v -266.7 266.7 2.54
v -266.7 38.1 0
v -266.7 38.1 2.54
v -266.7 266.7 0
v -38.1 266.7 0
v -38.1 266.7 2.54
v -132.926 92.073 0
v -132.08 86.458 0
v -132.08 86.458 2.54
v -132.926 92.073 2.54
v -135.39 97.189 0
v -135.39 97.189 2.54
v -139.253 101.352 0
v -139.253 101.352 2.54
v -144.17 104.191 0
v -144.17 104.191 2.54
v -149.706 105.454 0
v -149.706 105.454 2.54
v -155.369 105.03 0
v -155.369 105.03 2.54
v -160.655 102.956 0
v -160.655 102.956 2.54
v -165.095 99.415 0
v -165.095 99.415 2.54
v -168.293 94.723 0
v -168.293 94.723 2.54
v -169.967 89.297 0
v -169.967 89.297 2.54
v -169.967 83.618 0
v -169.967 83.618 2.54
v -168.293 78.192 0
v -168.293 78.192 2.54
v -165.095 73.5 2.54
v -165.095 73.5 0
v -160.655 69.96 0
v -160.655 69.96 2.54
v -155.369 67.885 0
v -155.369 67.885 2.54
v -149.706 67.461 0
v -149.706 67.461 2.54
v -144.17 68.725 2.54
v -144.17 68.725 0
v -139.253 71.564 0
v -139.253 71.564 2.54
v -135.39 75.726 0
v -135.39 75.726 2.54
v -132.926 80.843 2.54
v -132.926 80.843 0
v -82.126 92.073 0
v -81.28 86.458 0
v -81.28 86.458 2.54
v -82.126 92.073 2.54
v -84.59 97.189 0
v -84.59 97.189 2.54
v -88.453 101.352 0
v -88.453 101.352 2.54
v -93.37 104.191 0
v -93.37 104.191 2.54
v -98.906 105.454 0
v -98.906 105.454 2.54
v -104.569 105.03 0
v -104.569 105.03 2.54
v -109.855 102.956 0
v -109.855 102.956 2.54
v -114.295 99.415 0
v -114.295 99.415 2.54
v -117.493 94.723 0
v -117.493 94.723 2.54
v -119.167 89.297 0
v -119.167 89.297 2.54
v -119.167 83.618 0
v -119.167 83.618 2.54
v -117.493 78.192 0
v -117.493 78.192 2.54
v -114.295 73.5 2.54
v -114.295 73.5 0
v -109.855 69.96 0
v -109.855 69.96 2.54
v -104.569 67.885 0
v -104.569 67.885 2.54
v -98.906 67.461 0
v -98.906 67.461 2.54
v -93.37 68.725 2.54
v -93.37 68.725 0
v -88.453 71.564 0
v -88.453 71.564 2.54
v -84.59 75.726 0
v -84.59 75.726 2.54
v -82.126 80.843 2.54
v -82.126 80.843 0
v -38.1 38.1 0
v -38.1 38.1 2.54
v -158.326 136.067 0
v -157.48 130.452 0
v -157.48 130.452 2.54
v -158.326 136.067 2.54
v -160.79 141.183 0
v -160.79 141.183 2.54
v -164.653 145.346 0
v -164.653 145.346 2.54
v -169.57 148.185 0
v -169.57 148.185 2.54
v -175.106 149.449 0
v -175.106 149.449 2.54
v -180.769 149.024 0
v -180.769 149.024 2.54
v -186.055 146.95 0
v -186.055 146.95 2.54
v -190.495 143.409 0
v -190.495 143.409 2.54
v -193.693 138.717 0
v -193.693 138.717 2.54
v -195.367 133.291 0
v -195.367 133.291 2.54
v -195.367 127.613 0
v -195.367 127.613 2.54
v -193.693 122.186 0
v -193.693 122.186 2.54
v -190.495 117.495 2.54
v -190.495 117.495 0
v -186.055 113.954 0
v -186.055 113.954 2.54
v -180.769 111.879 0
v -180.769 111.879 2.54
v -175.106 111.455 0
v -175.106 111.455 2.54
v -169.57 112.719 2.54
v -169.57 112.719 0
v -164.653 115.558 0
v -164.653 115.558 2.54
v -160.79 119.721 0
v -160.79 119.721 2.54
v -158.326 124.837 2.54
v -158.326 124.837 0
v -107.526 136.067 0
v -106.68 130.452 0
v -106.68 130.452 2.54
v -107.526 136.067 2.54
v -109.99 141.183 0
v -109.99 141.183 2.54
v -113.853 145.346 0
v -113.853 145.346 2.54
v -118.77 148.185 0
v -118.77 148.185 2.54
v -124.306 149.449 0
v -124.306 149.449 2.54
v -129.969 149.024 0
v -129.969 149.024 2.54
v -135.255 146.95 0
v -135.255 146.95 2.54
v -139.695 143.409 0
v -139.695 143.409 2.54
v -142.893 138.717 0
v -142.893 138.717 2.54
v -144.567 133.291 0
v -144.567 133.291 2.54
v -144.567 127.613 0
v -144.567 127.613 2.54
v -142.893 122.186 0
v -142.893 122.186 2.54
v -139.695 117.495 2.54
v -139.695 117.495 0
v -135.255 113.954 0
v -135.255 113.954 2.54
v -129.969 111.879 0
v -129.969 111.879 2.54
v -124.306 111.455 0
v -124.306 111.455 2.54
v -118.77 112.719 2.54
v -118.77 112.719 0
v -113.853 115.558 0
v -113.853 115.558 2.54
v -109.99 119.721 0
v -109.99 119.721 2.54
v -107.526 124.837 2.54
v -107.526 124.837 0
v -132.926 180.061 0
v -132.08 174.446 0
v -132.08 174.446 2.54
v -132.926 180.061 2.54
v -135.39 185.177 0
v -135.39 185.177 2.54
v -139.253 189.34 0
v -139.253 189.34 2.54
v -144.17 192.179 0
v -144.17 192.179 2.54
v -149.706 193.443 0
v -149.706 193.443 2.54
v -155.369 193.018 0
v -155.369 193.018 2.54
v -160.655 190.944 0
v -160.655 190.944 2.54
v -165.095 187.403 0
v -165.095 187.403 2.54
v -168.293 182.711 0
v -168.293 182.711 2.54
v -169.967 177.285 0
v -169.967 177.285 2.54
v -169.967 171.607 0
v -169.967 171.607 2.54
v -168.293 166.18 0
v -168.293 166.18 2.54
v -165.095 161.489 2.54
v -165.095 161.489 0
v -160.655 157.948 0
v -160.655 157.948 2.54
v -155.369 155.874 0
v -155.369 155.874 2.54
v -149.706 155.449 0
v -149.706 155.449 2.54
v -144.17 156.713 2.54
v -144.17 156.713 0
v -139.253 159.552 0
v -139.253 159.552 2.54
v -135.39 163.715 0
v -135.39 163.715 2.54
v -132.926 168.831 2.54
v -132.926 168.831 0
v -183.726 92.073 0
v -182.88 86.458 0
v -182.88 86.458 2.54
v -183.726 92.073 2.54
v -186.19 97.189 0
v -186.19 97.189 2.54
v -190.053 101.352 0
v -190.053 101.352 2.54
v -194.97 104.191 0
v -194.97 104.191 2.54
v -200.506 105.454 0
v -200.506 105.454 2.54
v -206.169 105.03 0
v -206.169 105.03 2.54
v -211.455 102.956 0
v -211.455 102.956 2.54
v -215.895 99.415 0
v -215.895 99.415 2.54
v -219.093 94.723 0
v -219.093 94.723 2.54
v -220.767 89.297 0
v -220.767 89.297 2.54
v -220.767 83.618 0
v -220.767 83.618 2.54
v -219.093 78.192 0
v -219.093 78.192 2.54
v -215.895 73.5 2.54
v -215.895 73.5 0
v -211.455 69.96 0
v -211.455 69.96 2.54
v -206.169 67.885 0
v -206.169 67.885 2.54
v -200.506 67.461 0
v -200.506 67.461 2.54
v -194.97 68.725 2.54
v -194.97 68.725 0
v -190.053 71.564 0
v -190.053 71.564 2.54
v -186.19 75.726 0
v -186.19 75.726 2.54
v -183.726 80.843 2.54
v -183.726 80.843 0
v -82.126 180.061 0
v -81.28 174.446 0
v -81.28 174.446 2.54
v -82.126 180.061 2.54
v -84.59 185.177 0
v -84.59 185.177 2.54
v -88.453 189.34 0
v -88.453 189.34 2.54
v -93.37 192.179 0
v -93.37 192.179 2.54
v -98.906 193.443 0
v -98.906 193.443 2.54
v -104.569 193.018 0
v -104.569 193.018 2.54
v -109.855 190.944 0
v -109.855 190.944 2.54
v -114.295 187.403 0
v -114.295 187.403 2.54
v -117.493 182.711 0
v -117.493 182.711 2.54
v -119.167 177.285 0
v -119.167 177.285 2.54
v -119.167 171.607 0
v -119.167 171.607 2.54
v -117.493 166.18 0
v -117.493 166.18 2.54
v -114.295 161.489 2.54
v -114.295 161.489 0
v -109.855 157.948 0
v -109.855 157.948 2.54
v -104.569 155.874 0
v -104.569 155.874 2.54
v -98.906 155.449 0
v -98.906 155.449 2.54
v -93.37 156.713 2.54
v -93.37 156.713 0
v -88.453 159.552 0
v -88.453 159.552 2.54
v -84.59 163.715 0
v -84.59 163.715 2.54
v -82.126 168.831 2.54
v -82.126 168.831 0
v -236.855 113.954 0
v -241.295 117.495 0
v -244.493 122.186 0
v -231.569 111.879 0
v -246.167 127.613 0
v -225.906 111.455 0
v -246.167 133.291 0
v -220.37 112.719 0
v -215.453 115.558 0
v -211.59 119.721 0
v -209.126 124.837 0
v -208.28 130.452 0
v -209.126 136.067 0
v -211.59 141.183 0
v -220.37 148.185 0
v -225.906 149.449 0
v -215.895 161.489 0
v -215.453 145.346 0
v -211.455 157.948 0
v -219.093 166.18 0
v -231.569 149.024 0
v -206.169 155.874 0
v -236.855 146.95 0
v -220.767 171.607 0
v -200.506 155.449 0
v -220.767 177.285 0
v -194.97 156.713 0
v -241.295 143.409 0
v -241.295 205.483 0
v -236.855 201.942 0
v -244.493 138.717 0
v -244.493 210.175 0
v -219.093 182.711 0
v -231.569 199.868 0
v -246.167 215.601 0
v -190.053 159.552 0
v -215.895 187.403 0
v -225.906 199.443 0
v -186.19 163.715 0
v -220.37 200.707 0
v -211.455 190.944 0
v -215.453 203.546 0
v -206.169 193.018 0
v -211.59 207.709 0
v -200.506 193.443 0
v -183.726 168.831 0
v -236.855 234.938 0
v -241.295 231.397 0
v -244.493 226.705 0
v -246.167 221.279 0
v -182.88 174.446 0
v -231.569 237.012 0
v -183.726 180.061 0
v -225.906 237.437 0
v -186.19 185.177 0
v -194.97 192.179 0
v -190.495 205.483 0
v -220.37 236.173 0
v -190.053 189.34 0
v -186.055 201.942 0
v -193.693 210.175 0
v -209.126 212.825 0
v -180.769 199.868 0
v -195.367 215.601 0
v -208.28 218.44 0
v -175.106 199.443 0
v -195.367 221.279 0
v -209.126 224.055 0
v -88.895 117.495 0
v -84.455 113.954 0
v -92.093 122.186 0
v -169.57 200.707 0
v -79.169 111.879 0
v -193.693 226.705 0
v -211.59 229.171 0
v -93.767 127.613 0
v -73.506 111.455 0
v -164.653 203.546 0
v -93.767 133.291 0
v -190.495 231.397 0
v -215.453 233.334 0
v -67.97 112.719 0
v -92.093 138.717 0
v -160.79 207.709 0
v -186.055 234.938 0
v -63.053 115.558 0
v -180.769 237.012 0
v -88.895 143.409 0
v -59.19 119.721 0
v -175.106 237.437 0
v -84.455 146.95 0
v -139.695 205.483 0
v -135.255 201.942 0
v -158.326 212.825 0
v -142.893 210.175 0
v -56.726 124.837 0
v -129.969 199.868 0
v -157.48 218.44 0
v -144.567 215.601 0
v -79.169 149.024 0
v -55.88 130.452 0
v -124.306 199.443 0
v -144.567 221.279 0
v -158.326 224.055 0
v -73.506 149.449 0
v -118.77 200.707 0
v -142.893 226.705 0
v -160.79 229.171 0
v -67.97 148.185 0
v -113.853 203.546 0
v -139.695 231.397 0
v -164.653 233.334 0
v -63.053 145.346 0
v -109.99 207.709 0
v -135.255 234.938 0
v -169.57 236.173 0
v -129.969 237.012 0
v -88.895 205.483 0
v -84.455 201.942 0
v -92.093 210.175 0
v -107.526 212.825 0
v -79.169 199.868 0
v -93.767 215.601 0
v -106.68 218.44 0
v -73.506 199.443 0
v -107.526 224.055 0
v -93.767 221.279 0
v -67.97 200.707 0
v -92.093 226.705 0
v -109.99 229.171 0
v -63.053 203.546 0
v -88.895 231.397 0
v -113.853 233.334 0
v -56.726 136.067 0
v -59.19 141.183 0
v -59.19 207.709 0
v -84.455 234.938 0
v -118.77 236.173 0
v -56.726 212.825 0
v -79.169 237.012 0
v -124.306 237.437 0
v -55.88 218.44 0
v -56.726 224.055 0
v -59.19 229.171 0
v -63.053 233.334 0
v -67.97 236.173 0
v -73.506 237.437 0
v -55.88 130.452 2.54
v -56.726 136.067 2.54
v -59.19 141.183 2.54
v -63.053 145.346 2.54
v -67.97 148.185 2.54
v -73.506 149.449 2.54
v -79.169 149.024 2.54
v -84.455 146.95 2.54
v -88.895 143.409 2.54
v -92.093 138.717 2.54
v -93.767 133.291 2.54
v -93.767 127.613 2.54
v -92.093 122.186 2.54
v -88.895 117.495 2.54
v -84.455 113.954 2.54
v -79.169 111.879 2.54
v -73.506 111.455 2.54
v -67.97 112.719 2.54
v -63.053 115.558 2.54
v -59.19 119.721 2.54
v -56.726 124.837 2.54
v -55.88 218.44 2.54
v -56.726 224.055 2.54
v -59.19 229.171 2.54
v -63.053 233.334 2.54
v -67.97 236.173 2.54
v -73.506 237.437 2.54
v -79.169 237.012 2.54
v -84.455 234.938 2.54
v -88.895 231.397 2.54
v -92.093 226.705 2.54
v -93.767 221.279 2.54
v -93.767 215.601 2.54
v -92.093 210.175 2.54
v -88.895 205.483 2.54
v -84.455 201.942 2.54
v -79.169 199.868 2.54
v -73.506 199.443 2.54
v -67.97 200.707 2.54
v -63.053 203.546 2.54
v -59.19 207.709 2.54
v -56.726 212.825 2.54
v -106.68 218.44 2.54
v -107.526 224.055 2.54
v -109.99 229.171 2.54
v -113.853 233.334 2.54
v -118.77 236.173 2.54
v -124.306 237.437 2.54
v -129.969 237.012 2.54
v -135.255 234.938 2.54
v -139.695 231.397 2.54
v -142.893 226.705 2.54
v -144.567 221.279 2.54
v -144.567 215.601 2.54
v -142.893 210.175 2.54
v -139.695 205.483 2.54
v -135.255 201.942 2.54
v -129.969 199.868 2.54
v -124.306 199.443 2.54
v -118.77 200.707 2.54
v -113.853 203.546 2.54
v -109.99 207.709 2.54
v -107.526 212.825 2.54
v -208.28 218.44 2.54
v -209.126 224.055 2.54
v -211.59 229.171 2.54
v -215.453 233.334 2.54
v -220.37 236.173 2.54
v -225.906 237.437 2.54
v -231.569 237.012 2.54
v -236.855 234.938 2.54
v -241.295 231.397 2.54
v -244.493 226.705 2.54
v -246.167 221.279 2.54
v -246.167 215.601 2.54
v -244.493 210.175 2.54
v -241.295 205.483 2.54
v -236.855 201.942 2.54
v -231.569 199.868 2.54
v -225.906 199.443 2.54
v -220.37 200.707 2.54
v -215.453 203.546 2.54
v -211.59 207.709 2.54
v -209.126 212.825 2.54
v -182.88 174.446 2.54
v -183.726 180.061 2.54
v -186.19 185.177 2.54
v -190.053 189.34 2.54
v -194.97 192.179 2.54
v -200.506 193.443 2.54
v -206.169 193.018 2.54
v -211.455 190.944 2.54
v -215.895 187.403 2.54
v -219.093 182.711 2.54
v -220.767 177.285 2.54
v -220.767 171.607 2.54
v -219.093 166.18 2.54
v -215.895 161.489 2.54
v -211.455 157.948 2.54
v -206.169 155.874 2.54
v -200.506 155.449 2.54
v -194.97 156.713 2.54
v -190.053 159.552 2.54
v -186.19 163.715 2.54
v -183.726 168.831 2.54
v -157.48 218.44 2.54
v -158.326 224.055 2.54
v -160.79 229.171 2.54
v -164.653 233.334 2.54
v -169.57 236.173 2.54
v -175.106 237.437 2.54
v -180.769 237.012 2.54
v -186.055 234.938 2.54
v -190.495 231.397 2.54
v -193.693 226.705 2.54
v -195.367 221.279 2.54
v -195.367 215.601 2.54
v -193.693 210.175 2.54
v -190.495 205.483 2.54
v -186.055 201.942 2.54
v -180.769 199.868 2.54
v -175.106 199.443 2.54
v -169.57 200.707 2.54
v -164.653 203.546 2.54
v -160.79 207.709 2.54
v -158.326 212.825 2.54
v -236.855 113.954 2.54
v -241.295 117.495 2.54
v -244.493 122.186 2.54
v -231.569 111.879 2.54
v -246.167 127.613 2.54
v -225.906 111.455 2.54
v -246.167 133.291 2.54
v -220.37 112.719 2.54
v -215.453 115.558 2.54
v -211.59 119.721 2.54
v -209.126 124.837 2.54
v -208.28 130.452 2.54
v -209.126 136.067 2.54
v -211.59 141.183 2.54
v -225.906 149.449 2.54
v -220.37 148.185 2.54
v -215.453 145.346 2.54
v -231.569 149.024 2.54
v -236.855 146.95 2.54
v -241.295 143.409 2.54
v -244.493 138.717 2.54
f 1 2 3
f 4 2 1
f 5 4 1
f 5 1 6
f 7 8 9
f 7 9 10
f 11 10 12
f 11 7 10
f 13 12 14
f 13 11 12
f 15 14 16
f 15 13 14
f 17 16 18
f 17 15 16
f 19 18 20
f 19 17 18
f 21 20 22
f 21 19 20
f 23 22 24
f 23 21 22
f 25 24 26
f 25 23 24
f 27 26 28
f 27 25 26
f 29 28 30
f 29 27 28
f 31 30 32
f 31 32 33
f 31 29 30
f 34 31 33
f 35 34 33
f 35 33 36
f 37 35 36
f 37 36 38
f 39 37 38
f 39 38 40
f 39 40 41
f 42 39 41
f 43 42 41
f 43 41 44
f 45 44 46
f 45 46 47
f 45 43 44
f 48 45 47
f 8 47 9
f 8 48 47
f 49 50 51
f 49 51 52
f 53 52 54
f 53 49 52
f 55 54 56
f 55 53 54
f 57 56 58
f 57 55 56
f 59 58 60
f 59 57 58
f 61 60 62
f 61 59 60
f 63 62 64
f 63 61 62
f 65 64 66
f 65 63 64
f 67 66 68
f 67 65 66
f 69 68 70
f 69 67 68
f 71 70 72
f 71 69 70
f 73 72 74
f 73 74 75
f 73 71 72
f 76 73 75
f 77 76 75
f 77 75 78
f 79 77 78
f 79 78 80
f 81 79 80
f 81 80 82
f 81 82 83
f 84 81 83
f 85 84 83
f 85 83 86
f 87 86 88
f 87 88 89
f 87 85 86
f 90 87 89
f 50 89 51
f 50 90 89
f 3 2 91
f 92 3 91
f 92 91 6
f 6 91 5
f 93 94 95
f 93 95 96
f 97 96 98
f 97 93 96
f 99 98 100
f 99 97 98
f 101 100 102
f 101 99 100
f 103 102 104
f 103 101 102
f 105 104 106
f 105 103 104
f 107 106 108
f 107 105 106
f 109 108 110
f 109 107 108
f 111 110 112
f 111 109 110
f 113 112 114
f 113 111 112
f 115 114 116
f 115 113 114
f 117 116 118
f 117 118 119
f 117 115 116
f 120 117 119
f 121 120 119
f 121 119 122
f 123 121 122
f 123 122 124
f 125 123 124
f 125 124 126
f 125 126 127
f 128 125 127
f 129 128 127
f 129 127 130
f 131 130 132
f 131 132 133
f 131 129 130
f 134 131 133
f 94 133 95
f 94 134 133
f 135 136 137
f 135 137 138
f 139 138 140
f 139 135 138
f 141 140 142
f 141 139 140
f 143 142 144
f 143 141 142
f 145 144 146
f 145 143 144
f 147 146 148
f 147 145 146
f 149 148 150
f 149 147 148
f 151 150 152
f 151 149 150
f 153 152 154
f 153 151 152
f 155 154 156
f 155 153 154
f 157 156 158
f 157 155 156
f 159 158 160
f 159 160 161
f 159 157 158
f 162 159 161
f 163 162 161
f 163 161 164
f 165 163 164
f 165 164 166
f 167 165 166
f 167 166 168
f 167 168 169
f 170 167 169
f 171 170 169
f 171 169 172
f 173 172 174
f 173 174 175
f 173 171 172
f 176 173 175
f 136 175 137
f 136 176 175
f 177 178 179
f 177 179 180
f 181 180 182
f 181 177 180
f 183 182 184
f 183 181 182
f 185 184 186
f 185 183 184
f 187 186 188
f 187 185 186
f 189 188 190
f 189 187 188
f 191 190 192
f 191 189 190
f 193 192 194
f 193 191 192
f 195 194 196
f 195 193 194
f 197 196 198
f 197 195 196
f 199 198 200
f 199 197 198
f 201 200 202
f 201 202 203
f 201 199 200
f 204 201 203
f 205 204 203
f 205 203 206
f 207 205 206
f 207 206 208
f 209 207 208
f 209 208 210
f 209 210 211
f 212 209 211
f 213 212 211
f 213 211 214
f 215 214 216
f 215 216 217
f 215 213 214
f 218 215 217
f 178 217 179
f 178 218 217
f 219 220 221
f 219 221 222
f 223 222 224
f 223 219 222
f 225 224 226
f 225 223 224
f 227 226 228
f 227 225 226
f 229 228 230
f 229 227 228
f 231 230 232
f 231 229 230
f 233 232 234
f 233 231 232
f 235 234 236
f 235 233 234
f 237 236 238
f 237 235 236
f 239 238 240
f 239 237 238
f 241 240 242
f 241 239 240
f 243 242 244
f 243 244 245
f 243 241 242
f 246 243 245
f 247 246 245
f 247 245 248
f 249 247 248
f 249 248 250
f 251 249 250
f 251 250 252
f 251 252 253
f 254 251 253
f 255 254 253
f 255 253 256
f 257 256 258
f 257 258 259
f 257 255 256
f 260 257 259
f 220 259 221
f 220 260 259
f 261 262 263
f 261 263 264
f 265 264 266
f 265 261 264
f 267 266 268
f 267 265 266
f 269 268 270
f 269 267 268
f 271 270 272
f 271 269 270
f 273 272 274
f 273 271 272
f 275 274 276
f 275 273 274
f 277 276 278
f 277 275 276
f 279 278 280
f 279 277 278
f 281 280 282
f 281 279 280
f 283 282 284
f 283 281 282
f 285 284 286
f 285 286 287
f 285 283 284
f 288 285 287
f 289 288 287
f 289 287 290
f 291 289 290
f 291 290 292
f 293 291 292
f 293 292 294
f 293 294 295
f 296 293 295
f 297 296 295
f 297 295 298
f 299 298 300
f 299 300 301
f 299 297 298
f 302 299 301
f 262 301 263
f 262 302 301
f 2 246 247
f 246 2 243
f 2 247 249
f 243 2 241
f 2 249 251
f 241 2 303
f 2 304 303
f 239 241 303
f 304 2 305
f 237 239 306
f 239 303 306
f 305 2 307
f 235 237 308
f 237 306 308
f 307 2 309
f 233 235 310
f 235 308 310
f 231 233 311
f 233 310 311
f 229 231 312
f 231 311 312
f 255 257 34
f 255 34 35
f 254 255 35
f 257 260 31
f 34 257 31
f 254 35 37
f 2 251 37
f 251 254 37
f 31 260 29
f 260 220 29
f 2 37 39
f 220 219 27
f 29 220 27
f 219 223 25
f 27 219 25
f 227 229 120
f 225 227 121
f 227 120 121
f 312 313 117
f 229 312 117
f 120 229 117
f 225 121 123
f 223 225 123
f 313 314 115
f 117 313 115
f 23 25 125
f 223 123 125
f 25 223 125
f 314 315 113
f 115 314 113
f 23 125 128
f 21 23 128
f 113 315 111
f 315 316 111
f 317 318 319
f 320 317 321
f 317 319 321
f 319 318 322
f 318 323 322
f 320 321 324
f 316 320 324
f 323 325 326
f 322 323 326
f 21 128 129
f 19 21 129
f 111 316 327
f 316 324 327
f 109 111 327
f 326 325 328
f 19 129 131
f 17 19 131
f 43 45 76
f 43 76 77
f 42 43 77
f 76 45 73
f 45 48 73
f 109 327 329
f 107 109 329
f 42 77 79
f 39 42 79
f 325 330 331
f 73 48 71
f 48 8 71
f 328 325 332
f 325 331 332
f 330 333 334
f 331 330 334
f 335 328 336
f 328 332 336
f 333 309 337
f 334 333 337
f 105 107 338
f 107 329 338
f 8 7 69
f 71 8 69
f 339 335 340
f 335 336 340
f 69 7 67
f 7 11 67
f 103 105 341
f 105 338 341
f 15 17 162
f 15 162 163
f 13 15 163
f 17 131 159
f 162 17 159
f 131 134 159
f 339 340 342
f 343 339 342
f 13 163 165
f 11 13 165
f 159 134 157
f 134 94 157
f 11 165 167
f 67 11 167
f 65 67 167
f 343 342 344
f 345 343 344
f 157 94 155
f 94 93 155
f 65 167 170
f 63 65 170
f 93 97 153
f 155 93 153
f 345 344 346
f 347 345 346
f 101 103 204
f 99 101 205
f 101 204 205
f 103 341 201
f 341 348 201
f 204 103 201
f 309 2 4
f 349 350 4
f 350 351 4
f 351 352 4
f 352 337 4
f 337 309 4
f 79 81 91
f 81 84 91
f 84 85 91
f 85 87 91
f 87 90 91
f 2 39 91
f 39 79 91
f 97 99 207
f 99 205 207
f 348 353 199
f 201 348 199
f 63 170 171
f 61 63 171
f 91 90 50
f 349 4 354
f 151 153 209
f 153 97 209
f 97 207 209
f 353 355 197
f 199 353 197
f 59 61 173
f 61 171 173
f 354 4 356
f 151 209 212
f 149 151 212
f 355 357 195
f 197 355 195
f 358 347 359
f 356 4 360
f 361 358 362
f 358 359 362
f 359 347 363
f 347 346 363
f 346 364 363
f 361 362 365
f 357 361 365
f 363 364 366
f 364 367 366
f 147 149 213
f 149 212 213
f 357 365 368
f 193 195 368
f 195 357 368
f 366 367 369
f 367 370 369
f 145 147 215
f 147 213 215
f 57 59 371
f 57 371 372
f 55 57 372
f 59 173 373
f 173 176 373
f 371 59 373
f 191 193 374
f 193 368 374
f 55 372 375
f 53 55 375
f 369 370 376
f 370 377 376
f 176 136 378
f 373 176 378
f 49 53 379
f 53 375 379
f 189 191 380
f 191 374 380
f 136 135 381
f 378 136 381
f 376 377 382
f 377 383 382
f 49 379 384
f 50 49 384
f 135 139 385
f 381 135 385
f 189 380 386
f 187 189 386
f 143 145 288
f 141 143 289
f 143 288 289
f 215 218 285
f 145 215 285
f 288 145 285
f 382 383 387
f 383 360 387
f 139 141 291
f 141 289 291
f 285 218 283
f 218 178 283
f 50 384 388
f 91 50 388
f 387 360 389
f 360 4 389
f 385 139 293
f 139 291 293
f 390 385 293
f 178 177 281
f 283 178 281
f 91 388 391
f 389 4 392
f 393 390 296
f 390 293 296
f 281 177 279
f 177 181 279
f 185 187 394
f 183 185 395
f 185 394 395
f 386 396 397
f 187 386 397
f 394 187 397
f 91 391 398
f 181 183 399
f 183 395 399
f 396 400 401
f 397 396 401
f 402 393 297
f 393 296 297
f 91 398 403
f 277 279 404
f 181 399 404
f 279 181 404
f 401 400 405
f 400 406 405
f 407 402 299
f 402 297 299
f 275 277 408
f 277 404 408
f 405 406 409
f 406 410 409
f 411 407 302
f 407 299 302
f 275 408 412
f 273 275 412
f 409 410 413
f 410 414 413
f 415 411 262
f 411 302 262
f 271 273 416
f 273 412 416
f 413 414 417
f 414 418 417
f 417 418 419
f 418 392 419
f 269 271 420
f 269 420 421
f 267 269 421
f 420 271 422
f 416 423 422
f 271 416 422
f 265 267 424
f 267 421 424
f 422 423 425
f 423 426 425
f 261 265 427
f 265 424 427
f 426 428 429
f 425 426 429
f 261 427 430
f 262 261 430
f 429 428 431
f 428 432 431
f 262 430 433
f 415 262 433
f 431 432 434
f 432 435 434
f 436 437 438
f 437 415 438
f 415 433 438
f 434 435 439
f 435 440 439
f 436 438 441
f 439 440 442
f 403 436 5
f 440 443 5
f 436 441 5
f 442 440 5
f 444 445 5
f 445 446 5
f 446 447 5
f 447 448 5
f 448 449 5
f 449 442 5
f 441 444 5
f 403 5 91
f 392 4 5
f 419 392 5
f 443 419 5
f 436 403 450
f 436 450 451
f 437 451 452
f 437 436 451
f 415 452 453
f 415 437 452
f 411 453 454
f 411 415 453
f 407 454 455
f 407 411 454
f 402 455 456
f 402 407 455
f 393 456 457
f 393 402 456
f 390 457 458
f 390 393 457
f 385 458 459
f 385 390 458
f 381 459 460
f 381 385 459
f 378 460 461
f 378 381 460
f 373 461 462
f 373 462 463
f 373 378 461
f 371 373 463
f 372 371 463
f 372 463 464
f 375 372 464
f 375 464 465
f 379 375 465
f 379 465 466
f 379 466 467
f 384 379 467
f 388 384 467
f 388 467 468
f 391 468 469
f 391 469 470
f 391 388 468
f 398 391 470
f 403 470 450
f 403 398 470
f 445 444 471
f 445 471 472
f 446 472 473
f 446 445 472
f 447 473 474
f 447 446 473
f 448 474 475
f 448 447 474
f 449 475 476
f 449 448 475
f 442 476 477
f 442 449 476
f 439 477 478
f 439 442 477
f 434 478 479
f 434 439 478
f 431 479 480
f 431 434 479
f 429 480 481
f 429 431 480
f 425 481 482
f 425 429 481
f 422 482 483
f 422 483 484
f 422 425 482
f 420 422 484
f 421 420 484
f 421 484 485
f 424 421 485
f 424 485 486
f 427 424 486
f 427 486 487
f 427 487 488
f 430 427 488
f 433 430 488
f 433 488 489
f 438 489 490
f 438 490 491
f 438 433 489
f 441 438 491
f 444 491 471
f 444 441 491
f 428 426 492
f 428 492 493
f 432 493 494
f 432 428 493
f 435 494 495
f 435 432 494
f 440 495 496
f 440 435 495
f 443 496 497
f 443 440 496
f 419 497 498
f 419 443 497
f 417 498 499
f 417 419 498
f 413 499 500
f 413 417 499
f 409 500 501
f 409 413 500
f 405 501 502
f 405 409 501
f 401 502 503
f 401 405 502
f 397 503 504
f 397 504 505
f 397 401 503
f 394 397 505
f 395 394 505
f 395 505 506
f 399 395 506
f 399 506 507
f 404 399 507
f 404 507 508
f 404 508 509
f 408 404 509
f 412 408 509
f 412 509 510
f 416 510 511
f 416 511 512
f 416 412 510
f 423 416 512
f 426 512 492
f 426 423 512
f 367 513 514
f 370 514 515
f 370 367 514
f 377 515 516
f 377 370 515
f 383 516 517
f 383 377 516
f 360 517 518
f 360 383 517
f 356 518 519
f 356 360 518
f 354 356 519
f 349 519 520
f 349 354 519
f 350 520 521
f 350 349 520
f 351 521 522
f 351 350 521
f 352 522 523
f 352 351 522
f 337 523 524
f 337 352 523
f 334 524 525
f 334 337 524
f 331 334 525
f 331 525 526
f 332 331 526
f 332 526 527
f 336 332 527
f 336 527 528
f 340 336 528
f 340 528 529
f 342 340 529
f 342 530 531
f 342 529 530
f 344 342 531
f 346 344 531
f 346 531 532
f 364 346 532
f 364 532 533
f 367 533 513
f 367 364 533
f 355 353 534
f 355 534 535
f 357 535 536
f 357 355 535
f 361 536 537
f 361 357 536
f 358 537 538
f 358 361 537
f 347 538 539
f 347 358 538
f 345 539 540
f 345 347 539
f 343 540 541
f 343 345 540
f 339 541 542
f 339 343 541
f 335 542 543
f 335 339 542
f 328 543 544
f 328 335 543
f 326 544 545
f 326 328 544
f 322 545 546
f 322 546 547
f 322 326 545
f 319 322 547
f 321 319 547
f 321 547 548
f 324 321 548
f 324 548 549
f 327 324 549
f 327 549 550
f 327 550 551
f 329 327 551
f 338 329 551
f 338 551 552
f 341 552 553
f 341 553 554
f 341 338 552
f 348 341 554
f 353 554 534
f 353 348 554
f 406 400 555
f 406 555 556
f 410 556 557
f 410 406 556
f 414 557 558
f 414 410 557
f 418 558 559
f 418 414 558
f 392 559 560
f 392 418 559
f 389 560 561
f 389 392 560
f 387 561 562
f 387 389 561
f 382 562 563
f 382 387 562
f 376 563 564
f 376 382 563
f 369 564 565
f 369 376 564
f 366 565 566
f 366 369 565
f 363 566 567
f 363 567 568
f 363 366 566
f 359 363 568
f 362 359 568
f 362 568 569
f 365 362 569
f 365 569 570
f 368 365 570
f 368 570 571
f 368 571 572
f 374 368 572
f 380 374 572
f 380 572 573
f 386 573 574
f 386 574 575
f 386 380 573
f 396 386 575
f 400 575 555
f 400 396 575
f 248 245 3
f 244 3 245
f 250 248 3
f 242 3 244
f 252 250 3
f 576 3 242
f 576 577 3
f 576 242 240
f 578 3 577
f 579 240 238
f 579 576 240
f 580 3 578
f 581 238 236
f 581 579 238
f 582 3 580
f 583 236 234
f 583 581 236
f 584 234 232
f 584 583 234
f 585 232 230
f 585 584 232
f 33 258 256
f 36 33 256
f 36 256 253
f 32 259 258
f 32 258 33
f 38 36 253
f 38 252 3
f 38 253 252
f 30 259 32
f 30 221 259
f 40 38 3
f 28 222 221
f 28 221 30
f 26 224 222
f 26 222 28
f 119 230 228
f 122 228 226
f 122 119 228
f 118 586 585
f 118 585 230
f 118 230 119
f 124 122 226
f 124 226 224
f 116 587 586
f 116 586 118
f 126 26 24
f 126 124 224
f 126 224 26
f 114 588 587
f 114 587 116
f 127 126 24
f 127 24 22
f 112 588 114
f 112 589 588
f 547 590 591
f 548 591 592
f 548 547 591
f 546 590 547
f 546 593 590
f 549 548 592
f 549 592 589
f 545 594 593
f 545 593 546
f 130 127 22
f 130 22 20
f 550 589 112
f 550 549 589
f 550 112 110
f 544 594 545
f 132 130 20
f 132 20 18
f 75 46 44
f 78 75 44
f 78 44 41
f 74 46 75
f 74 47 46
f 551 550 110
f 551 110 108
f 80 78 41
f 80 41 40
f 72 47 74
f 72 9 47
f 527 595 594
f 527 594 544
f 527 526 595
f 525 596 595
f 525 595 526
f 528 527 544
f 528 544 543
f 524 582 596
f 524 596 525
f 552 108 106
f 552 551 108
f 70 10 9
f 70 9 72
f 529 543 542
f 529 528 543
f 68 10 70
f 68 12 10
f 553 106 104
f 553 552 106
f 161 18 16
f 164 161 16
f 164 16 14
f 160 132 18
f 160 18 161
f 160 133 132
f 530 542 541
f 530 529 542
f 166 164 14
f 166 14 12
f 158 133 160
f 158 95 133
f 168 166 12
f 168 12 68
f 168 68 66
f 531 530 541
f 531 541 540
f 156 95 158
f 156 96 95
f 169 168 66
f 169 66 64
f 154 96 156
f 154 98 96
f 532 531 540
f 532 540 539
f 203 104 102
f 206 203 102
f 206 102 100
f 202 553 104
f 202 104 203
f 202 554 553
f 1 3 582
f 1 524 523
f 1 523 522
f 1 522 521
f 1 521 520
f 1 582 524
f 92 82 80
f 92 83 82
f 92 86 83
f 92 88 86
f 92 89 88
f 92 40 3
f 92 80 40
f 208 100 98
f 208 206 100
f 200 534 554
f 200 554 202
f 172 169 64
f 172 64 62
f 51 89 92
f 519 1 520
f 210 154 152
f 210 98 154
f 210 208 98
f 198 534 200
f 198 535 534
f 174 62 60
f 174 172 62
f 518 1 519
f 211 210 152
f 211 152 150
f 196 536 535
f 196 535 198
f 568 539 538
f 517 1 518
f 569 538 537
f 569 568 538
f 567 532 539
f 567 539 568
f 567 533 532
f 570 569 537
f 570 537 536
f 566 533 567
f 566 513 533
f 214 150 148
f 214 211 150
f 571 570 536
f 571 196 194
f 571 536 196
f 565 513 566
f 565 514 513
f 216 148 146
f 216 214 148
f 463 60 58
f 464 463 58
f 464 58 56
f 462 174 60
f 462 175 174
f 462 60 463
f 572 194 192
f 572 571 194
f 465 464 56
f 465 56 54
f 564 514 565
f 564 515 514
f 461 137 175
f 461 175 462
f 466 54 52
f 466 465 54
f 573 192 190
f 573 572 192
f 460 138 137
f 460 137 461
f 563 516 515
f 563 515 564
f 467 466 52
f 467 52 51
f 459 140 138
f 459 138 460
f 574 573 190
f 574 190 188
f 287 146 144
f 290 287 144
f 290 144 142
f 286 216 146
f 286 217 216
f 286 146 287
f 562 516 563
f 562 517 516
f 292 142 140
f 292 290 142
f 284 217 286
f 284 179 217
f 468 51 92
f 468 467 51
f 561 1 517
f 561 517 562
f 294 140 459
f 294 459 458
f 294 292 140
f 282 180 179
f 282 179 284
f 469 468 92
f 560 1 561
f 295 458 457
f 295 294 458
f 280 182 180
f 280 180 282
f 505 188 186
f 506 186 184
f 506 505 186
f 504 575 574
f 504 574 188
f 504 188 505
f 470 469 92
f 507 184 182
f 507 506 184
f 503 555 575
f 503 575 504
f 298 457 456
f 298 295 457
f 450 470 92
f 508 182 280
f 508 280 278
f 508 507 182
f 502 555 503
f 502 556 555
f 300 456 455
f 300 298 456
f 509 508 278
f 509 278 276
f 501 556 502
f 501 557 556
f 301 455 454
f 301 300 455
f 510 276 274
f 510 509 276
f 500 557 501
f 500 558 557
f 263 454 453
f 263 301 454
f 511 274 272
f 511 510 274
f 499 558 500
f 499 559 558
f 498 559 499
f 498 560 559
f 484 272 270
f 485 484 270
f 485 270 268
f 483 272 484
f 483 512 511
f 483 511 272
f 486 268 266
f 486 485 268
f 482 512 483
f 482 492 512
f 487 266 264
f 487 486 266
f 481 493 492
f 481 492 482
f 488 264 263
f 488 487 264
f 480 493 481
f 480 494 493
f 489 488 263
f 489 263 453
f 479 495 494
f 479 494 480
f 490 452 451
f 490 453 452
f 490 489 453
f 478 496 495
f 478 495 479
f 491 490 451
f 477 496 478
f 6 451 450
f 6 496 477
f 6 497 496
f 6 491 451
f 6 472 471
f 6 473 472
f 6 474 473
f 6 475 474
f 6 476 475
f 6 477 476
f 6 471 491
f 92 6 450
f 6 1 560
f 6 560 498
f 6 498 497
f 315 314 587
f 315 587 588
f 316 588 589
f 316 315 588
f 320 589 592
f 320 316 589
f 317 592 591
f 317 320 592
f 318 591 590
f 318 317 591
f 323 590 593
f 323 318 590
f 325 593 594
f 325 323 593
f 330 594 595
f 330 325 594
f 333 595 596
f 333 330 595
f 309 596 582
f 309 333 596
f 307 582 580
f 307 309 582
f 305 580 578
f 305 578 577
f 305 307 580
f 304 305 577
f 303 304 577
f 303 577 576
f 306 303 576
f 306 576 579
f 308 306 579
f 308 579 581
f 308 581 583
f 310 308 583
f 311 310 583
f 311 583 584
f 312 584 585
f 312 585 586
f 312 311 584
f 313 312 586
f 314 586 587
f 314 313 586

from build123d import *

# Parameters (mm, degrees)
SKETCH1_W               = 228.6
SKETCH1_H               = 228.6
BOSS_EXTRUDE1_DEPTH     = 2.54
SKETCH4_R               = 19.05
CUT_EXTRUDE2_DEPTH      = 378.179309613
FILL_PATTERN2_OUTLINE_R = 19.05
FILL_PATTERN2_DEPTH     = 2.54


# Read off the part's stored shape, not the designer's step: Fill Pattern2
with BuildPart() as part:
    # Sketch1 → Boss-Extrude1 (new body)
    with BuildSketch(Plane.XY):
        with Locations((-152.4, 152.4)):
            Rectangle(SKETCH1_W, SKETCH1_H)
    extrude(amount=BOSS_EXTRUDE1_DEPTH)

    # Sketch4 → Cut-Extrude2 (cut, through all)
    with BuildSketch(Plane.XY):
        with Locations((-227.33, 218.44)):
            Circle(SKETCH4_R)
    extrude(amount=CUT_EXTRUDE2_DEPTH, mode=Mode.SUBTRACT)

    # Fill Pattern2 outline → Fill Pattern2 (cut)
    with BuildSketch(Plane.XY):
        with Locations((-74.93, 130.451818976)):
            Circle(FILL_PATTERN2_OUTLINE_R)
        with Locations((-201.93, 86.457728463)):
            Circle(FILL_PATTERN2_OUTLINE_R)
        with Locations((-176.53, 218.44)):
            Circle(FILL_PATTERN2_OUTLINE_R)
        with Locations((-201.93, 174.445909488)):
            Circle(FILL_PATTERN2_OUTLINE_R)
        with Locations((-227.33, 130.451818976)):
            Circle(FILL_PATTERN2_OUTLINE_R)
        with Locations((-125.73, 130.451818976)):
            Circle(FILL_PATTERN2_OUTLINE_R)
        with Locations((-100.33, 174.445909488)):
            Circle(FILL_PATTERN2_OUTLINE_R)
        with Locations((-74.93, 218.44)):
            Circle(FILL_PATTERN2_OUTLINE_R)
        with Locations((-100.33, 86.457728463)):
            Circle(FILL_PATTERN2_OUTLINE_R)
        with Locations((-176.53, 130.451818976)):
            Circle(FILL_PATTERN2_OUTLINE_R)
        with Locations((-151.13, 174.445909488)):
            Circle(FILL_PATTERN2_OUTLINE_R)
        with Locations((-125.73, 218.44)):
            Circle(FILL_PATTERN2_OUTLINE_R)
        with Locations((-151.13, 86.457728463)):
            Circle(FILL_PATTERN2_OUTLINE_R)
    extrude(amount=FILL_PATTERN2_DEPTH, mode=Mode.SUBTRACT)


solid = part.part
